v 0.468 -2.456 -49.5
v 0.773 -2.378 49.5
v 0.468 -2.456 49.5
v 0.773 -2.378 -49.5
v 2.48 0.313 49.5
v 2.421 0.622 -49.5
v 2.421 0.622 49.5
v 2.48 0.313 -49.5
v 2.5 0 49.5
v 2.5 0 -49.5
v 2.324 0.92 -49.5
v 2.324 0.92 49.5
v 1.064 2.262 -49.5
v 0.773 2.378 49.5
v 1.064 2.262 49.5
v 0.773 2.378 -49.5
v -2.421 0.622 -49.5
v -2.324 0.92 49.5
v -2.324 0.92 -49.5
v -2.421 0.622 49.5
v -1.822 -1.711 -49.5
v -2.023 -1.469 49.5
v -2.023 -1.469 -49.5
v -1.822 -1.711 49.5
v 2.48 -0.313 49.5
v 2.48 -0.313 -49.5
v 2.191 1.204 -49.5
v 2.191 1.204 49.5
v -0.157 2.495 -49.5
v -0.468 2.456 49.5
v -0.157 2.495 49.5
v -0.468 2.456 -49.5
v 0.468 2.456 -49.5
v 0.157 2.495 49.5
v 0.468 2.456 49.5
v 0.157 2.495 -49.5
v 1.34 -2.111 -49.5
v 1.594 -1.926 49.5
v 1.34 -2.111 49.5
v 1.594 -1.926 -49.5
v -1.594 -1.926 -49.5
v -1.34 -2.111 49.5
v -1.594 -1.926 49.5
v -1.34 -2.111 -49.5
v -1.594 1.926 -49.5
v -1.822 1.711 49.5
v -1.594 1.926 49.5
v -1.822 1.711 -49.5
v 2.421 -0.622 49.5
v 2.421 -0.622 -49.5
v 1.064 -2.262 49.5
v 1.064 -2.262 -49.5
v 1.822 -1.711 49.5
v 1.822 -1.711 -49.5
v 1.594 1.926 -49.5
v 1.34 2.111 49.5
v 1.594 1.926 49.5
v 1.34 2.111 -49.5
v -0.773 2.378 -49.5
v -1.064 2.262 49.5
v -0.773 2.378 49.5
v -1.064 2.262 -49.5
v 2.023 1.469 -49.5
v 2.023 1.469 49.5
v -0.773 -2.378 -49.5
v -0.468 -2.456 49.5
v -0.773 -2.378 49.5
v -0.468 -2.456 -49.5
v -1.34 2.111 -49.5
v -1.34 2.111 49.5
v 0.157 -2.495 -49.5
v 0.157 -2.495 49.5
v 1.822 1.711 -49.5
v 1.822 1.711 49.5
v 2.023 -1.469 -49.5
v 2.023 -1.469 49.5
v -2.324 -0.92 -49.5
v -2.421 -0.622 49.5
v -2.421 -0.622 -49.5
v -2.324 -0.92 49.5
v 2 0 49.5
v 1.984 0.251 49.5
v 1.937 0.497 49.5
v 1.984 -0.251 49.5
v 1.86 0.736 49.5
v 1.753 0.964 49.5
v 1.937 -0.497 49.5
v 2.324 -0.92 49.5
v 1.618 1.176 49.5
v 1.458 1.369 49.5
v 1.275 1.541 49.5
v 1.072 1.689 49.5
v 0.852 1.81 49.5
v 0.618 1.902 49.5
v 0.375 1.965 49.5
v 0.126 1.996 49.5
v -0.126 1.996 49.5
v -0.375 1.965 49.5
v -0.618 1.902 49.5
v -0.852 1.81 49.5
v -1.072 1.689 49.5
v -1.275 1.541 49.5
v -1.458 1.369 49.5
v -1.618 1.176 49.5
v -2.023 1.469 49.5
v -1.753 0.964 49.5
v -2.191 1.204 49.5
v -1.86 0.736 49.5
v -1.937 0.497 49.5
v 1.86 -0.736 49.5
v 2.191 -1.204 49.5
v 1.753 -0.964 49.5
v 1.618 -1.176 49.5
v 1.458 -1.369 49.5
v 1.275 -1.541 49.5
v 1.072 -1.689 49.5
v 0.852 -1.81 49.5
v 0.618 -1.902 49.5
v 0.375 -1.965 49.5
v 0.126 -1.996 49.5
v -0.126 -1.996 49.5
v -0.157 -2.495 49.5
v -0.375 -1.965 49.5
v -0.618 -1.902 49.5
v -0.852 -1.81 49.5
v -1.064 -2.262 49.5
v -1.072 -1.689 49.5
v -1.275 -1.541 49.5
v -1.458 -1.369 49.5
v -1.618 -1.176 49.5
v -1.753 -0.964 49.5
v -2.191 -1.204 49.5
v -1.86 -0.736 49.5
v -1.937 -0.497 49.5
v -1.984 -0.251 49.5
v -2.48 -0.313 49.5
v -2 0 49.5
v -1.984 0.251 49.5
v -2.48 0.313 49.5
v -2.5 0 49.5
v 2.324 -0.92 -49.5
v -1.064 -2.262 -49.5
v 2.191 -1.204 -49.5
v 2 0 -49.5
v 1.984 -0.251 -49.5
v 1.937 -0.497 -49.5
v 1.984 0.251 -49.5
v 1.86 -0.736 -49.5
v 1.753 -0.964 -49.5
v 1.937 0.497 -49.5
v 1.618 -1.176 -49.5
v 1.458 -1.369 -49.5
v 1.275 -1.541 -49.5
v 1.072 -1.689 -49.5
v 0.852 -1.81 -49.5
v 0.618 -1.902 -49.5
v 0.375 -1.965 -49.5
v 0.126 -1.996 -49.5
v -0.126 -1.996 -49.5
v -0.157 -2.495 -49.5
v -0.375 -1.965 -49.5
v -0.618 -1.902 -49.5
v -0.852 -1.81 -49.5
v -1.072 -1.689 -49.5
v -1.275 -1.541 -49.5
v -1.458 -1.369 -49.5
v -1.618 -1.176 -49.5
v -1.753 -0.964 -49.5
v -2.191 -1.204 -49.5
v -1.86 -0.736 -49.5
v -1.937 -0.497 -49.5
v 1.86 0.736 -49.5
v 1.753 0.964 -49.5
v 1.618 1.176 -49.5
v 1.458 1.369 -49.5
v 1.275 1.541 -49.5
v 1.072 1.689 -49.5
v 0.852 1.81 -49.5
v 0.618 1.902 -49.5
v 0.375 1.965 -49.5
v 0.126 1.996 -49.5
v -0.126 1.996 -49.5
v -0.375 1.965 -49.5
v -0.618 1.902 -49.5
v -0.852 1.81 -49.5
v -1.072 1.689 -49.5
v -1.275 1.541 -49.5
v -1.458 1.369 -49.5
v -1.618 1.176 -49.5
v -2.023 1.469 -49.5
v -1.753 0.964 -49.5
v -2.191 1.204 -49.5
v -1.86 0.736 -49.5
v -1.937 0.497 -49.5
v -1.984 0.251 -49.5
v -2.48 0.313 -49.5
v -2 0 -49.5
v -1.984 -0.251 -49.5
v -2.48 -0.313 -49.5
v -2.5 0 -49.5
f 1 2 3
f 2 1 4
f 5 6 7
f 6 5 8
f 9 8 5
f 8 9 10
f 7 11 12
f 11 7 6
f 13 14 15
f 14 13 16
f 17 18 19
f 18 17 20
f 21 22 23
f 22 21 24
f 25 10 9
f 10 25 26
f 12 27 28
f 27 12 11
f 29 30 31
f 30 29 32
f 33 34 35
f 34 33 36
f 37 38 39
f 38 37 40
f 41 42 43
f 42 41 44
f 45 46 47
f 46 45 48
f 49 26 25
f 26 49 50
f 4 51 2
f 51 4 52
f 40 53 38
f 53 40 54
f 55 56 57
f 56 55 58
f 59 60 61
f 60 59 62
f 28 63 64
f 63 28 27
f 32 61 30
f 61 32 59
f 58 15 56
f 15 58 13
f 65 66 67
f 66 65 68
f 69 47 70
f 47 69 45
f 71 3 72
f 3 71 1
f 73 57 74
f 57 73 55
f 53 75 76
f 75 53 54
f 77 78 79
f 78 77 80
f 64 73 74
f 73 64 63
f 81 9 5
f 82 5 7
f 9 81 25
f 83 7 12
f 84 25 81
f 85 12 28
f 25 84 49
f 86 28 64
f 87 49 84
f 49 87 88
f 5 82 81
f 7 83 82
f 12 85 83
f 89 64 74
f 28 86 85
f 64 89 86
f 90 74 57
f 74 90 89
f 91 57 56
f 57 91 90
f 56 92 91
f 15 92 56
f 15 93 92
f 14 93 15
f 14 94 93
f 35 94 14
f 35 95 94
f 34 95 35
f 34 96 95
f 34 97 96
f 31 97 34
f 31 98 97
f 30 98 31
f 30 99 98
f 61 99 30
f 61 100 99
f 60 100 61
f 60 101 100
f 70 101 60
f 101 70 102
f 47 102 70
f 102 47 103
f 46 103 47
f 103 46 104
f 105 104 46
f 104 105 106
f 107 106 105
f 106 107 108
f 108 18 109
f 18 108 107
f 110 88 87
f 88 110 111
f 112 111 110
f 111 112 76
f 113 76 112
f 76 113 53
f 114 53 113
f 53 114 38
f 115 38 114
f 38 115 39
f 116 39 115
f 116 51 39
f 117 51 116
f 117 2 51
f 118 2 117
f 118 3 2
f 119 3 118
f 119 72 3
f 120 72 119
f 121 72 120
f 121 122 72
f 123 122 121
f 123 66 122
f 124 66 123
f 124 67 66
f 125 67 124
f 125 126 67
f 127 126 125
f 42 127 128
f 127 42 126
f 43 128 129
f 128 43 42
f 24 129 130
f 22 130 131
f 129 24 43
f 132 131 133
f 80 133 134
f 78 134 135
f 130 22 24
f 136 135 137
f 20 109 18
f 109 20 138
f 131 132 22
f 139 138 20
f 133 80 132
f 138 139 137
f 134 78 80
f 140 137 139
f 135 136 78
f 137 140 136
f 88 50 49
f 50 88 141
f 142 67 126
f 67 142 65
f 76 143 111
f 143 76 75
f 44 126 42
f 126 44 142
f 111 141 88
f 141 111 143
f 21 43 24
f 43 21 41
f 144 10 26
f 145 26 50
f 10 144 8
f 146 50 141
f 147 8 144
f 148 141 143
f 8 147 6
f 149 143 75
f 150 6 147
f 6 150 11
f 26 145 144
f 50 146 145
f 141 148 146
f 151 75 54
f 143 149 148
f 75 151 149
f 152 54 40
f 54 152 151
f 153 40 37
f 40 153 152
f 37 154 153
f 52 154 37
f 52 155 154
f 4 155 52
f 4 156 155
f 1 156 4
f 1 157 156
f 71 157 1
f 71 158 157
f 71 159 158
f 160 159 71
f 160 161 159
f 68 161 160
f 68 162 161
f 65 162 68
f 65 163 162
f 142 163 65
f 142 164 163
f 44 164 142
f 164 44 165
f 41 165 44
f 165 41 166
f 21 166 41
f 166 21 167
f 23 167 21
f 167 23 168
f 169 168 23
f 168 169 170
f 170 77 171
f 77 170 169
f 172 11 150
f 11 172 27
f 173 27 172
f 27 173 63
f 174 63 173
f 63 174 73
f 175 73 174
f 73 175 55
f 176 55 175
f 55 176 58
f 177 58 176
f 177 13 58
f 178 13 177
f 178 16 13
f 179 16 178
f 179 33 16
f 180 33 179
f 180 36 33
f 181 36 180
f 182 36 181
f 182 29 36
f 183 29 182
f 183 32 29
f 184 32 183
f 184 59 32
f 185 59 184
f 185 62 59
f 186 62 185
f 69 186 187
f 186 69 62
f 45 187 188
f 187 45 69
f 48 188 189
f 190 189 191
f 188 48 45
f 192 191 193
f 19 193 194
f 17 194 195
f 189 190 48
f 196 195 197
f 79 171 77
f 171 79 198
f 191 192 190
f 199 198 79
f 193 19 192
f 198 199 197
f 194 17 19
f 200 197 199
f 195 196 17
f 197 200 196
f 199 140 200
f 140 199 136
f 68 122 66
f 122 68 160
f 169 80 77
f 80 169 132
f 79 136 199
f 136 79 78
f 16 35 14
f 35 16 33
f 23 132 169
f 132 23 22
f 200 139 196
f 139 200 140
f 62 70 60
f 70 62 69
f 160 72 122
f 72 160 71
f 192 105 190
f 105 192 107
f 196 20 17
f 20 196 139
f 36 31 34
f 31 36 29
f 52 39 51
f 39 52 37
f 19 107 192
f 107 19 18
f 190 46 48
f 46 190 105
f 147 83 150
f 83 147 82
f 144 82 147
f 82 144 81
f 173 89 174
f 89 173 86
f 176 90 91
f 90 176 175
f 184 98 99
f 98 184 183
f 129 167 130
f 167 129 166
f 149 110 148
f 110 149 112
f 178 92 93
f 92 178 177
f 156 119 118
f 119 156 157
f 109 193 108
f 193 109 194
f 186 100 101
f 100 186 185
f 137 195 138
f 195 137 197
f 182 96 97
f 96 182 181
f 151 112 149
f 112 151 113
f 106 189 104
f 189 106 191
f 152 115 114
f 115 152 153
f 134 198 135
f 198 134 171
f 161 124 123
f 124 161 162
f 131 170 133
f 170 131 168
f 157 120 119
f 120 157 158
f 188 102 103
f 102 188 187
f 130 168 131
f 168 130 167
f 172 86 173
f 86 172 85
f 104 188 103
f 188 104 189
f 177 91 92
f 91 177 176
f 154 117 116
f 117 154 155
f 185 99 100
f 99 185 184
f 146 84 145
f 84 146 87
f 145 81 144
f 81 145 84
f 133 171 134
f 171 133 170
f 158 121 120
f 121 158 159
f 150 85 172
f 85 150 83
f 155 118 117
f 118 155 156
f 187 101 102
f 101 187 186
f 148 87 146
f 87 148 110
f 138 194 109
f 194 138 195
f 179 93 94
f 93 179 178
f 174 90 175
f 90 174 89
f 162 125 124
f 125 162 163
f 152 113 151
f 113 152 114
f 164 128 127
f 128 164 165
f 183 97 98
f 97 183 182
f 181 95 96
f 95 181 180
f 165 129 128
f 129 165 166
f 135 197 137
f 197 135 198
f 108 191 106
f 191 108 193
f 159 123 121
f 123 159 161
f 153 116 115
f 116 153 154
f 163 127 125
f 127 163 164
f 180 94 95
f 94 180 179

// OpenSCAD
$fn = 50;


difference() {
	union() {
		translate(v = [0, 0, -49.5000000000]) {
			cylinder(h = 99, r = 2.5000000000);
		}
	}
	union() {
		translate(v = [0, 0, -100.0000000000]) {
			cylinder(h = 200, r = 2.0000000000);
		}
	}
}
